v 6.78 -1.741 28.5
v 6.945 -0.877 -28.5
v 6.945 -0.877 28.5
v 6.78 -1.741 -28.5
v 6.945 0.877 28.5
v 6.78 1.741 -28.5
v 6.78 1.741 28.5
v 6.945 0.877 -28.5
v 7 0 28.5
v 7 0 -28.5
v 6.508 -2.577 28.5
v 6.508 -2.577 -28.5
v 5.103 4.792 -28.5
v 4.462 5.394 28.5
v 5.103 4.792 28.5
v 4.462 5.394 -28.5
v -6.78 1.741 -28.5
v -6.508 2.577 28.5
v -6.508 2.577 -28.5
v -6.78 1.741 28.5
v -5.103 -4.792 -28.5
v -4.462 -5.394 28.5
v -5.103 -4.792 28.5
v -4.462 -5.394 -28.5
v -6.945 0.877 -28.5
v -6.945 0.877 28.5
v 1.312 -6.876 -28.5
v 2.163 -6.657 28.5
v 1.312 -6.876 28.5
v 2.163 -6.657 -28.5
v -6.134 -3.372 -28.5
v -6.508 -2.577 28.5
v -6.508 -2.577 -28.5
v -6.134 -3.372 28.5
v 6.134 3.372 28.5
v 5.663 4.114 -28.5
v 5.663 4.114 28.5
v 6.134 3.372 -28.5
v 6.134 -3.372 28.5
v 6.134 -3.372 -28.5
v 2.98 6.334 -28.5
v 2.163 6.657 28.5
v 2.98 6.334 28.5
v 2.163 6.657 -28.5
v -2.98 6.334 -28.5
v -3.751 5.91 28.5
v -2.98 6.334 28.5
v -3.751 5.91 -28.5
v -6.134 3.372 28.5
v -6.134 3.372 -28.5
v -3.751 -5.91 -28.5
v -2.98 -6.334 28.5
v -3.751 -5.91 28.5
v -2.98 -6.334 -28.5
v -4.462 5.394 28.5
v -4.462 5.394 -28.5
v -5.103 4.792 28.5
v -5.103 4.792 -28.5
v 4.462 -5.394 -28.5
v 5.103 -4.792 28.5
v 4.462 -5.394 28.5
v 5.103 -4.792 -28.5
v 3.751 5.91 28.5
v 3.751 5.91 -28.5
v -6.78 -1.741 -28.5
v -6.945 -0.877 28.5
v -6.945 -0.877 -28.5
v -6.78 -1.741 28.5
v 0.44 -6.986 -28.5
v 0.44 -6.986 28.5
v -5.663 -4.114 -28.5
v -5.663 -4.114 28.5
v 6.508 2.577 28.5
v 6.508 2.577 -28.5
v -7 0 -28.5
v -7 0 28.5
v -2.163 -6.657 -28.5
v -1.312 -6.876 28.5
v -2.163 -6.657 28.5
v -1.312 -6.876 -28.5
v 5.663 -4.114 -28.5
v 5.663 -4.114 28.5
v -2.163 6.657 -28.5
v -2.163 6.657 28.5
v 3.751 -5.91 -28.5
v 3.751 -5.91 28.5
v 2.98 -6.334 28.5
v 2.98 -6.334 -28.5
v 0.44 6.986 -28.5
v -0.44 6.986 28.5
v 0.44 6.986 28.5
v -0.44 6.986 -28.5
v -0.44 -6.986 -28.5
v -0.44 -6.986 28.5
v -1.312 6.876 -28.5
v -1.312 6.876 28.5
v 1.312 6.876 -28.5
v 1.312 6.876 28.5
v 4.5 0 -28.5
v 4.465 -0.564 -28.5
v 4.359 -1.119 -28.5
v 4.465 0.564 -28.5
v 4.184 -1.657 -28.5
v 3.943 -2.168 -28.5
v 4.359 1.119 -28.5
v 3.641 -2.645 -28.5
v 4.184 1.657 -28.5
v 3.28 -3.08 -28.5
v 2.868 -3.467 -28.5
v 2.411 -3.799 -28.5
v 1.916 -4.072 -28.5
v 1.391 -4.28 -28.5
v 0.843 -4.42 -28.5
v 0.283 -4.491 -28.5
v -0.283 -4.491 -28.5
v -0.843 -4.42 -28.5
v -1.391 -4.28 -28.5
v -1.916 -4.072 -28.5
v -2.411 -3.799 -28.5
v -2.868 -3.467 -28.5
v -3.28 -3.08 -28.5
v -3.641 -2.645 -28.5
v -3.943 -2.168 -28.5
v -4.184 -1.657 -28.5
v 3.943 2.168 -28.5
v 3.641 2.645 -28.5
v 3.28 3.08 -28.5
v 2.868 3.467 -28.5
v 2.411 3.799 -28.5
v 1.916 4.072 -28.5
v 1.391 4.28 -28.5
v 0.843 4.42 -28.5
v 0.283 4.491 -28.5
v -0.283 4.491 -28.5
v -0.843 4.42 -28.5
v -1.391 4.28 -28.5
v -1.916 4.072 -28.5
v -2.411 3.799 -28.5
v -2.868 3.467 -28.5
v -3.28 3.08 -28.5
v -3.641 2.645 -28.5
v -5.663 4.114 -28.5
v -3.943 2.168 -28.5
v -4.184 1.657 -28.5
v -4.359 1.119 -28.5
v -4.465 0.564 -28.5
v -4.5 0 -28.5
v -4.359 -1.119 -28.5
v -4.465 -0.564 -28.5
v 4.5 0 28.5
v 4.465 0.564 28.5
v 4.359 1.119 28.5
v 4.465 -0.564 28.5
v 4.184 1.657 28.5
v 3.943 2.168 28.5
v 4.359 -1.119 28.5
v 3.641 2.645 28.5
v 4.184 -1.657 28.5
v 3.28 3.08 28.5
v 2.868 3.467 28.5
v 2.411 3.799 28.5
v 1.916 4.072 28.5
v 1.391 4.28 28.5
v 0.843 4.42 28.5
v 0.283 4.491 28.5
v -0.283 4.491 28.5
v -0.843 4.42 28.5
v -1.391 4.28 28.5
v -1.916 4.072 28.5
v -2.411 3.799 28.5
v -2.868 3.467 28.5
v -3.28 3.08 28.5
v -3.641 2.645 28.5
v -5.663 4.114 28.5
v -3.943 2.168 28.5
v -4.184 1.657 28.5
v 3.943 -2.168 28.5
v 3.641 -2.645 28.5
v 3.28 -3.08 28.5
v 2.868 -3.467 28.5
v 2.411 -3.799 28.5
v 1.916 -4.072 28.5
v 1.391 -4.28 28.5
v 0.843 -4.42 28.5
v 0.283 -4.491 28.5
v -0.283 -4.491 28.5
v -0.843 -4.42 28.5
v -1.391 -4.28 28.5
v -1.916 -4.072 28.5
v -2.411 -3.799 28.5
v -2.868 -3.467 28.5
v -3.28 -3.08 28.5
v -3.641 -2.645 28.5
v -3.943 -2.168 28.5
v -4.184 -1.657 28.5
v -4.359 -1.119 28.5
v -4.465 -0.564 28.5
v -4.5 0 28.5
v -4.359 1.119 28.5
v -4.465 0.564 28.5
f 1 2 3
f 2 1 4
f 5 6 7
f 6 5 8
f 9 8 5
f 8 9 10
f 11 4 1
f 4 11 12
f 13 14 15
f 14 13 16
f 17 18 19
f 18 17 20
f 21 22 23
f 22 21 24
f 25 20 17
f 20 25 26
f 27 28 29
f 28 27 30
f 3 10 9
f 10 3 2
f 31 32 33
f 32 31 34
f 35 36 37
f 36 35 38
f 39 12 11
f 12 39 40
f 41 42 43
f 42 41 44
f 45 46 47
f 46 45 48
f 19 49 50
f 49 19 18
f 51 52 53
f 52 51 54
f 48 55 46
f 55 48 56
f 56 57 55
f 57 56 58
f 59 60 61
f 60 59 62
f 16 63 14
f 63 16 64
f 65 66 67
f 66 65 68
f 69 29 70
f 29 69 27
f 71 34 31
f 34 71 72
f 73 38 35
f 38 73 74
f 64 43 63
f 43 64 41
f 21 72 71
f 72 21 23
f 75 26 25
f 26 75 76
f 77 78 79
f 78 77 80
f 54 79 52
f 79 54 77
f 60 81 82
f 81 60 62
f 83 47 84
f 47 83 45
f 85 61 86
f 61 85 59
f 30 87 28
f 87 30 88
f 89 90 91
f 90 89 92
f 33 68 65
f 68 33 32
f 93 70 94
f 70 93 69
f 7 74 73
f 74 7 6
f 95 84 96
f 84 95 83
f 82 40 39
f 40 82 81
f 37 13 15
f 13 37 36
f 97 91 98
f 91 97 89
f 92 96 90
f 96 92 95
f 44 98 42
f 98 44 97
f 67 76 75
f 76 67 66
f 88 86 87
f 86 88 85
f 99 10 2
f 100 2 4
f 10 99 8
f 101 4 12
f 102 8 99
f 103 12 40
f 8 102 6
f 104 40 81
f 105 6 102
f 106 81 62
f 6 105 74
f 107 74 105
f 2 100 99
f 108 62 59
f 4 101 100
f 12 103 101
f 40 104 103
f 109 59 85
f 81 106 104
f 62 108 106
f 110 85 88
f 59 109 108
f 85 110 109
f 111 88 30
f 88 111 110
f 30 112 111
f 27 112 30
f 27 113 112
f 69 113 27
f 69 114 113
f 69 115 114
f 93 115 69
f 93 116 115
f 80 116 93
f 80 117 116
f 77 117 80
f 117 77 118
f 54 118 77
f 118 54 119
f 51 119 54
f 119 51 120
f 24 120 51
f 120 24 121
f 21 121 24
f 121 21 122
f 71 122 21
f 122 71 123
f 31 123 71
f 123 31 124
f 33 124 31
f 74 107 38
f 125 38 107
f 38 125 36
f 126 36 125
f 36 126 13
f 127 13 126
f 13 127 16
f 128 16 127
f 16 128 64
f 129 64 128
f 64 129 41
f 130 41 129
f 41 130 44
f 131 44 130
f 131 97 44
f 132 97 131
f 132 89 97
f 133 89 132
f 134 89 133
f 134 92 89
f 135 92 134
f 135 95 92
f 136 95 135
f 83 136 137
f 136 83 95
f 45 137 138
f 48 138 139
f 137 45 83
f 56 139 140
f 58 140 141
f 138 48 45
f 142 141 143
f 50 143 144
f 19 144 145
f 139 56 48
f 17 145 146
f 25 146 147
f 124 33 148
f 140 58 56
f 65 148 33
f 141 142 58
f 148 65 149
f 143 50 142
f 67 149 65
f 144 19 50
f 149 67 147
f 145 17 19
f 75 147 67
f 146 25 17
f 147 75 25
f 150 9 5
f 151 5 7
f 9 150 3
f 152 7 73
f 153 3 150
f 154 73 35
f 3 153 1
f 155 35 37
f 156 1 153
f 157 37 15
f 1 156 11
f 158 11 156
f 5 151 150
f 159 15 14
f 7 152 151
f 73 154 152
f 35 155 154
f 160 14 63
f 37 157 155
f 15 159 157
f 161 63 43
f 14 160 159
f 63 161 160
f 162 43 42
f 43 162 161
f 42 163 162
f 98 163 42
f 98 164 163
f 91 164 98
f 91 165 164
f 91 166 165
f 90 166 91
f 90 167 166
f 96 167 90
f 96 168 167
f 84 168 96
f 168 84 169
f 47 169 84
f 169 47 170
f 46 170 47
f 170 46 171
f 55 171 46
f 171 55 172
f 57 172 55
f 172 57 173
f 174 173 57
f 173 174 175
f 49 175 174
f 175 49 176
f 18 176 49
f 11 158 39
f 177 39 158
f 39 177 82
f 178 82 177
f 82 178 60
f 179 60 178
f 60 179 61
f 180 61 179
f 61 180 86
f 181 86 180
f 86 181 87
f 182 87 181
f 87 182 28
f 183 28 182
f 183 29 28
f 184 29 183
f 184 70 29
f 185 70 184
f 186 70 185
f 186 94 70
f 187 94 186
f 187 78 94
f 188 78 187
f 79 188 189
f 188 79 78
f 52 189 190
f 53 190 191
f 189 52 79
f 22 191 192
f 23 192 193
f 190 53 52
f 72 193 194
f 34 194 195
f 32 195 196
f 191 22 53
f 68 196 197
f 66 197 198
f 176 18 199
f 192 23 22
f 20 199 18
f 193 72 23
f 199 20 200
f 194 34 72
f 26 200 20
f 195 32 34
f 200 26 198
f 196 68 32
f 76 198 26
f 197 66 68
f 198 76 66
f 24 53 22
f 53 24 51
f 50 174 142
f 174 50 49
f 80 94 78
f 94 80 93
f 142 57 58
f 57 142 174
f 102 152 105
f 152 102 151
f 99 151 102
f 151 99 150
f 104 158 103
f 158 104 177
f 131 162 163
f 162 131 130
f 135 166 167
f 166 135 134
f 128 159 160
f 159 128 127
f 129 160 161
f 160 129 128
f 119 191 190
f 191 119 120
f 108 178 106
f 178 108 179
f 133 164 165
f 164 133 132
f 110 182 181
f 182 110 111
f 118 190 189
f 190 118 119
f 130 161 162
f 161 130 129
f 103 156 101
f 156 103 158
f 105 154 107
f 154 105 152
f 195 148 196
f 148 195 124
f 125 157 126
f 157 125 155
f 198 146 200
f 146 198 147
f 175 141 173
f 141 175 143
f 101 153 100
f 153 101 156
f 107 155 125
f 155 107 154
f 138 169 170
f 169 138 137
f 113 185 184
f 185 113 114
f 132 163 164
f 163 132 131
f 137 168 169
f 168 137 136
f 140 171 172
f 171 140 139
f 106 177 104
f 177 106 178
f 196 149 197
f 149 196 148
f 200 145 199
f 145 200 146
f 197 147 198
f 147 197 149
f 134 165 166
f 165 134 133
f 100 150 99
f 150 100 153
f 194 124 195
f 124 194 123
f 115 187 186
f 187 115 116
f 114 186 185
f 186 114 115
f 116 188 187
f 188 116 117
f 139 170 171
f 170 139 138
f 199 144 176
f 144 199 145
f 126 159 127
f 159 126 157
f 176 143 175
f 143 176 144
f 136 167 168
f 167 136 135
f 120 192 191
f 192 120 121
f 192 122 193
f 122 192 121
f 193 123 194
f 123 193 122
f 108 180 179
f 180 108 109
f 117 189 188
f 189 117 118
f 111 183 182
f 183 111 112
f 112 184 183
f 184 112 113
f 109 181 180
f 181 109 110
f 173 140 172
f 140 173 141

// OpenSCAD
$fn = 50;


difference() {
	union() {
		translate(v = [0, 0, -28.5000000000]) {
			cylinder(h = 57, r = 7.0000000000);
		}
	}
	union() {
		translate(v = [0, 0, -100.0000000000]) {
			cylinder(h = 200, r = 4.5000000000);
		}
	}
}
